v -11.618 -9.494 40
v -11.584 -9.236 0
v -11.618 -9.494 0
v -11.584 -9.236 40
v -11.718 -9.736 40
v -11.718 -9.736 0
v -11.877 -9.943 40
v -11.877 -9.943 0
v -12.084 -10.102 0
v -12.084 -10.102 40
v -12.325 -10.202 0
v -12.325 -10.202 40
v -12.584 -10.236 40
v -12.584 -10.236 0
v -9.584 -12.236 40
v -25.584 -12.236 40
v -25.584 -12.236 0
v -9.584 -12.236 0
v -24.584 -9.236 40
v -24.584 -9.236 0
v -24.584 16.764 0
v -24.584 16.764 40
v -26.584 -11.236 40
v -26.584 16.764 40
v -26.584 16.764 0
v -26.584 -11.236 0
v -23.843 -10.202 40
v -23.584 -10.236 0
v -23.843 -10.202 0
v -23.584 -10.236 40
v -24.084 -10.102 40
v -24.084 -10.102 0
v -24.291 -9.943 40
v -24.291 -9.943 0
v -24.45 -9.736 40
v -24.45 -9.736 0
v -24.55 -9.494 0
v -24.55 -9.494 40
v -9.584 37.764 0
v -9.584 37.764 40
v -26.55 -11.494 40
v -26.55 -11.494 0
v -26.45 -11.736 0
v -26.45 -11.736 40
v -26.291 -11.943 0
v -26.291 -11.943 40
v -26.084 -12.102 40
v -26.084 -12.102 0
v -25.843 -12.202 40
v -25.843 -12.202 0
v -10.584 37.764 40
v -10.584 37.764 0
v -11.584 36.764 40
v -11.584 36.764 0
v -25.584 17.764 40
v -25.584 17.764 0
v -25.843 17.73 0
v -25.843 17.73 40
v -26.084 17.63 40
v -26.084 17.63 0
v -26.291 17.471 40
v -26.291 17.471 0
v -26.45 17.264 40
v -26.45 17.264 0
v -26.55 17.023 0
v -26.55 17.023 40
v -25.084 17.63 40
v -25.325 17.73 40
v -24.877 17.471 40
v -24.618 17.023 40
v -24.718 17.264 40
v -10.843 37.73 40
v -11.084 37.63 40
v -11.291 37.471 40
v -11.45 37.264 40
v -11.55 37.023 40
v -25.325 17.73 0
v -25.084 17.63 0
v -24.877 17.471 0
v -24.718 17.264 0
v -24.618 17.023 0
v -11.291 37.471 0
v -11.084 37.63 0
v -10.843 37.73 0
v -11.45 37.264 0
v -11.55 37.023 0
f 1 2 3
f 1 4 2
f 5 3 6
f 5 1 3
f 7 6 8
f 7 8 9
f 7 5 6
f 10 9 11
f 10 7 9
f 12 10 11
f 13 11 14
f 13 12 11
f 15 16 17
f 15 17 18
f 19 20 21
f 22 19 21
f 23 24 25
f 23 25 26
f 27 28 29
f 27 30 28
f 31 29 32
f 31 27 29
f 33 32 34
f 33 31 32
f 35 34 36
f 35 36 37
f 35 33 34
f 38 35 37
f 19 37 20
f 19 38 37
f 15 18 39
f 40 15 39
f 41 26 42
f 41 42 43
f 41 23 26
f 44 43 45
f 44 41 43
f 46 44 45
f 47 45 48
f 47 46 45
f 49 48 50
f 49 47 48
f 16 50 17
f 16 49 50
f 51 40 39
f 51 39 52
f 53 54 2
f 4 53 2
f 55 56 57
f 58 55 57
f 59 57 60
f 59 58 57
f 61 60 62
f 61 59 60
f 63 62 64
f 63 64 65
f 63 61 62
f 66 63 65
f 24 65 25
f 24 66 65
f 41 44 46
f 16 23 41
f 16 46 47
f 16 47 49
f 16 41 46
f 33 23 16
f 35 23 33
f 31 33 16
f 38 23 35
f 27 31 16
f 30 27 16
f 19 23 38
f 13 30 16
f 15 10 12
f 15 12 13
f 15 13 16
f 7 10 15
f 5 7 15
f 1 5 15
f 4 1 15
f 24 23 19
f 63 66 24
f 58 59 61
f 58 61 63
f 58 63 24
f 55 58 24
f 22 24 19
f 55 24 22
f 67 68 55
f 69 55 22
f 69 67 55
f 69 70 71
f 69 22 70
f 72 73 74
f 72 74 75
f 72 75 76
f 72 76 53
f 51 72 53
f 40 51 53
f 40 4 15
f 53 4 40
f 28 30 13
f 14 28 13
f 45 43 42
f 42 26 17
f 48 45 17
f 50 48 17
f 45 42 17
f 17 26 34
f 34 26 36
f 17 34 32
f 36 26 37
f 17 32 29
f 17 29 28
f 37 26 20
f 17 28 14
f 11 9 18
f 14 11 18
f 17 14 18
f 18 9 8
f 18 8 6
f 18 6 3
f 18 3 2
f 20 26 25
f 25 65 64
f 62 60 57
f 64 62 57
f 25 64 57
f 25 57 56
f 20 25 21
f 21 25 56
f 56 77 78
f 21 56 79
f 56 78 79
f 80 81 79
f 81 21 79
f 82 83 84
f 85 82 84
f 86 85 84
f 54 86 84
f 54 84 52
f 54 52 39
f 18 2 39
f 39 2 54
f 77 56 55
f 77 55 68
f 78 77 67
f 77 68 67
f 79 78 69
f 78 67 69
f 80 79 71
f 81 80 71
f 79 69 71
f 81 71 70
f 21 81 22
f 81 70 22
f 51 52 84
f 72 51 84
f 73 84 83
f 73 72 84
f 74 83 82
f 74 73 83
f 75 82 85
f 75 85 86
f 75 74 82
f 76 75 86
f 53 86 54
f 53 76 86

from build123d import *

# Parameters (mm, degrees)
F0_W     = 13
F0_H     = 2
F1_DEPTH = 40
F2_R     = 0.99999


# Not quite as in the source:
# - a fillet or chamfer is up to 0.001 mm smaller than in the source, because OpenCascade refuses the exact size


with BuildPart() as f1:
    # F0 (on Top) → F1 (new body)
    with BuildSketch(Plane.XY):
        Polygon((-24.5838956386, 17.7643506003), (-26.5838956386, 17.7643506003), (-26.5838956386, -12.2356493997), (-24.5838956386, -12.2356493997), (-24.5838956386, -10.2356493997), align=None)
        with Locations((-18.0838956386, -11.2356493997)):
            Rectangle(F0_W, F0_H)
        Polygon((-11.5838956386, 37.7643506003), (-11.5838956386, -10.2356493997), (-11.5838956386, -12.2356493997), (-9.5838956386, -12.2356493997), (-9.5838956386, 37.7643506003), align=None)
    extrude(amount=F1_DEPTH)

    # F2 (radius 1 in the source; OpenCascade refuses exactly that, so slightly less here)
    f2_edges = [f1.edges().sort_by_distance(p)[0] for p in [
        (-26.583896, 17.764351, 20),
        (-24.583896, 17.764351, 20),
        (-11.583896, 37.764351, 20),
        (-26.583896, -12.235649, 20),
        (-24.583896, -10.235649, 20),
        (-11.583896, -10.235649, 20),
    ]]
    fillet(f2_edges, radius=F2_R)


solid = f1.part
